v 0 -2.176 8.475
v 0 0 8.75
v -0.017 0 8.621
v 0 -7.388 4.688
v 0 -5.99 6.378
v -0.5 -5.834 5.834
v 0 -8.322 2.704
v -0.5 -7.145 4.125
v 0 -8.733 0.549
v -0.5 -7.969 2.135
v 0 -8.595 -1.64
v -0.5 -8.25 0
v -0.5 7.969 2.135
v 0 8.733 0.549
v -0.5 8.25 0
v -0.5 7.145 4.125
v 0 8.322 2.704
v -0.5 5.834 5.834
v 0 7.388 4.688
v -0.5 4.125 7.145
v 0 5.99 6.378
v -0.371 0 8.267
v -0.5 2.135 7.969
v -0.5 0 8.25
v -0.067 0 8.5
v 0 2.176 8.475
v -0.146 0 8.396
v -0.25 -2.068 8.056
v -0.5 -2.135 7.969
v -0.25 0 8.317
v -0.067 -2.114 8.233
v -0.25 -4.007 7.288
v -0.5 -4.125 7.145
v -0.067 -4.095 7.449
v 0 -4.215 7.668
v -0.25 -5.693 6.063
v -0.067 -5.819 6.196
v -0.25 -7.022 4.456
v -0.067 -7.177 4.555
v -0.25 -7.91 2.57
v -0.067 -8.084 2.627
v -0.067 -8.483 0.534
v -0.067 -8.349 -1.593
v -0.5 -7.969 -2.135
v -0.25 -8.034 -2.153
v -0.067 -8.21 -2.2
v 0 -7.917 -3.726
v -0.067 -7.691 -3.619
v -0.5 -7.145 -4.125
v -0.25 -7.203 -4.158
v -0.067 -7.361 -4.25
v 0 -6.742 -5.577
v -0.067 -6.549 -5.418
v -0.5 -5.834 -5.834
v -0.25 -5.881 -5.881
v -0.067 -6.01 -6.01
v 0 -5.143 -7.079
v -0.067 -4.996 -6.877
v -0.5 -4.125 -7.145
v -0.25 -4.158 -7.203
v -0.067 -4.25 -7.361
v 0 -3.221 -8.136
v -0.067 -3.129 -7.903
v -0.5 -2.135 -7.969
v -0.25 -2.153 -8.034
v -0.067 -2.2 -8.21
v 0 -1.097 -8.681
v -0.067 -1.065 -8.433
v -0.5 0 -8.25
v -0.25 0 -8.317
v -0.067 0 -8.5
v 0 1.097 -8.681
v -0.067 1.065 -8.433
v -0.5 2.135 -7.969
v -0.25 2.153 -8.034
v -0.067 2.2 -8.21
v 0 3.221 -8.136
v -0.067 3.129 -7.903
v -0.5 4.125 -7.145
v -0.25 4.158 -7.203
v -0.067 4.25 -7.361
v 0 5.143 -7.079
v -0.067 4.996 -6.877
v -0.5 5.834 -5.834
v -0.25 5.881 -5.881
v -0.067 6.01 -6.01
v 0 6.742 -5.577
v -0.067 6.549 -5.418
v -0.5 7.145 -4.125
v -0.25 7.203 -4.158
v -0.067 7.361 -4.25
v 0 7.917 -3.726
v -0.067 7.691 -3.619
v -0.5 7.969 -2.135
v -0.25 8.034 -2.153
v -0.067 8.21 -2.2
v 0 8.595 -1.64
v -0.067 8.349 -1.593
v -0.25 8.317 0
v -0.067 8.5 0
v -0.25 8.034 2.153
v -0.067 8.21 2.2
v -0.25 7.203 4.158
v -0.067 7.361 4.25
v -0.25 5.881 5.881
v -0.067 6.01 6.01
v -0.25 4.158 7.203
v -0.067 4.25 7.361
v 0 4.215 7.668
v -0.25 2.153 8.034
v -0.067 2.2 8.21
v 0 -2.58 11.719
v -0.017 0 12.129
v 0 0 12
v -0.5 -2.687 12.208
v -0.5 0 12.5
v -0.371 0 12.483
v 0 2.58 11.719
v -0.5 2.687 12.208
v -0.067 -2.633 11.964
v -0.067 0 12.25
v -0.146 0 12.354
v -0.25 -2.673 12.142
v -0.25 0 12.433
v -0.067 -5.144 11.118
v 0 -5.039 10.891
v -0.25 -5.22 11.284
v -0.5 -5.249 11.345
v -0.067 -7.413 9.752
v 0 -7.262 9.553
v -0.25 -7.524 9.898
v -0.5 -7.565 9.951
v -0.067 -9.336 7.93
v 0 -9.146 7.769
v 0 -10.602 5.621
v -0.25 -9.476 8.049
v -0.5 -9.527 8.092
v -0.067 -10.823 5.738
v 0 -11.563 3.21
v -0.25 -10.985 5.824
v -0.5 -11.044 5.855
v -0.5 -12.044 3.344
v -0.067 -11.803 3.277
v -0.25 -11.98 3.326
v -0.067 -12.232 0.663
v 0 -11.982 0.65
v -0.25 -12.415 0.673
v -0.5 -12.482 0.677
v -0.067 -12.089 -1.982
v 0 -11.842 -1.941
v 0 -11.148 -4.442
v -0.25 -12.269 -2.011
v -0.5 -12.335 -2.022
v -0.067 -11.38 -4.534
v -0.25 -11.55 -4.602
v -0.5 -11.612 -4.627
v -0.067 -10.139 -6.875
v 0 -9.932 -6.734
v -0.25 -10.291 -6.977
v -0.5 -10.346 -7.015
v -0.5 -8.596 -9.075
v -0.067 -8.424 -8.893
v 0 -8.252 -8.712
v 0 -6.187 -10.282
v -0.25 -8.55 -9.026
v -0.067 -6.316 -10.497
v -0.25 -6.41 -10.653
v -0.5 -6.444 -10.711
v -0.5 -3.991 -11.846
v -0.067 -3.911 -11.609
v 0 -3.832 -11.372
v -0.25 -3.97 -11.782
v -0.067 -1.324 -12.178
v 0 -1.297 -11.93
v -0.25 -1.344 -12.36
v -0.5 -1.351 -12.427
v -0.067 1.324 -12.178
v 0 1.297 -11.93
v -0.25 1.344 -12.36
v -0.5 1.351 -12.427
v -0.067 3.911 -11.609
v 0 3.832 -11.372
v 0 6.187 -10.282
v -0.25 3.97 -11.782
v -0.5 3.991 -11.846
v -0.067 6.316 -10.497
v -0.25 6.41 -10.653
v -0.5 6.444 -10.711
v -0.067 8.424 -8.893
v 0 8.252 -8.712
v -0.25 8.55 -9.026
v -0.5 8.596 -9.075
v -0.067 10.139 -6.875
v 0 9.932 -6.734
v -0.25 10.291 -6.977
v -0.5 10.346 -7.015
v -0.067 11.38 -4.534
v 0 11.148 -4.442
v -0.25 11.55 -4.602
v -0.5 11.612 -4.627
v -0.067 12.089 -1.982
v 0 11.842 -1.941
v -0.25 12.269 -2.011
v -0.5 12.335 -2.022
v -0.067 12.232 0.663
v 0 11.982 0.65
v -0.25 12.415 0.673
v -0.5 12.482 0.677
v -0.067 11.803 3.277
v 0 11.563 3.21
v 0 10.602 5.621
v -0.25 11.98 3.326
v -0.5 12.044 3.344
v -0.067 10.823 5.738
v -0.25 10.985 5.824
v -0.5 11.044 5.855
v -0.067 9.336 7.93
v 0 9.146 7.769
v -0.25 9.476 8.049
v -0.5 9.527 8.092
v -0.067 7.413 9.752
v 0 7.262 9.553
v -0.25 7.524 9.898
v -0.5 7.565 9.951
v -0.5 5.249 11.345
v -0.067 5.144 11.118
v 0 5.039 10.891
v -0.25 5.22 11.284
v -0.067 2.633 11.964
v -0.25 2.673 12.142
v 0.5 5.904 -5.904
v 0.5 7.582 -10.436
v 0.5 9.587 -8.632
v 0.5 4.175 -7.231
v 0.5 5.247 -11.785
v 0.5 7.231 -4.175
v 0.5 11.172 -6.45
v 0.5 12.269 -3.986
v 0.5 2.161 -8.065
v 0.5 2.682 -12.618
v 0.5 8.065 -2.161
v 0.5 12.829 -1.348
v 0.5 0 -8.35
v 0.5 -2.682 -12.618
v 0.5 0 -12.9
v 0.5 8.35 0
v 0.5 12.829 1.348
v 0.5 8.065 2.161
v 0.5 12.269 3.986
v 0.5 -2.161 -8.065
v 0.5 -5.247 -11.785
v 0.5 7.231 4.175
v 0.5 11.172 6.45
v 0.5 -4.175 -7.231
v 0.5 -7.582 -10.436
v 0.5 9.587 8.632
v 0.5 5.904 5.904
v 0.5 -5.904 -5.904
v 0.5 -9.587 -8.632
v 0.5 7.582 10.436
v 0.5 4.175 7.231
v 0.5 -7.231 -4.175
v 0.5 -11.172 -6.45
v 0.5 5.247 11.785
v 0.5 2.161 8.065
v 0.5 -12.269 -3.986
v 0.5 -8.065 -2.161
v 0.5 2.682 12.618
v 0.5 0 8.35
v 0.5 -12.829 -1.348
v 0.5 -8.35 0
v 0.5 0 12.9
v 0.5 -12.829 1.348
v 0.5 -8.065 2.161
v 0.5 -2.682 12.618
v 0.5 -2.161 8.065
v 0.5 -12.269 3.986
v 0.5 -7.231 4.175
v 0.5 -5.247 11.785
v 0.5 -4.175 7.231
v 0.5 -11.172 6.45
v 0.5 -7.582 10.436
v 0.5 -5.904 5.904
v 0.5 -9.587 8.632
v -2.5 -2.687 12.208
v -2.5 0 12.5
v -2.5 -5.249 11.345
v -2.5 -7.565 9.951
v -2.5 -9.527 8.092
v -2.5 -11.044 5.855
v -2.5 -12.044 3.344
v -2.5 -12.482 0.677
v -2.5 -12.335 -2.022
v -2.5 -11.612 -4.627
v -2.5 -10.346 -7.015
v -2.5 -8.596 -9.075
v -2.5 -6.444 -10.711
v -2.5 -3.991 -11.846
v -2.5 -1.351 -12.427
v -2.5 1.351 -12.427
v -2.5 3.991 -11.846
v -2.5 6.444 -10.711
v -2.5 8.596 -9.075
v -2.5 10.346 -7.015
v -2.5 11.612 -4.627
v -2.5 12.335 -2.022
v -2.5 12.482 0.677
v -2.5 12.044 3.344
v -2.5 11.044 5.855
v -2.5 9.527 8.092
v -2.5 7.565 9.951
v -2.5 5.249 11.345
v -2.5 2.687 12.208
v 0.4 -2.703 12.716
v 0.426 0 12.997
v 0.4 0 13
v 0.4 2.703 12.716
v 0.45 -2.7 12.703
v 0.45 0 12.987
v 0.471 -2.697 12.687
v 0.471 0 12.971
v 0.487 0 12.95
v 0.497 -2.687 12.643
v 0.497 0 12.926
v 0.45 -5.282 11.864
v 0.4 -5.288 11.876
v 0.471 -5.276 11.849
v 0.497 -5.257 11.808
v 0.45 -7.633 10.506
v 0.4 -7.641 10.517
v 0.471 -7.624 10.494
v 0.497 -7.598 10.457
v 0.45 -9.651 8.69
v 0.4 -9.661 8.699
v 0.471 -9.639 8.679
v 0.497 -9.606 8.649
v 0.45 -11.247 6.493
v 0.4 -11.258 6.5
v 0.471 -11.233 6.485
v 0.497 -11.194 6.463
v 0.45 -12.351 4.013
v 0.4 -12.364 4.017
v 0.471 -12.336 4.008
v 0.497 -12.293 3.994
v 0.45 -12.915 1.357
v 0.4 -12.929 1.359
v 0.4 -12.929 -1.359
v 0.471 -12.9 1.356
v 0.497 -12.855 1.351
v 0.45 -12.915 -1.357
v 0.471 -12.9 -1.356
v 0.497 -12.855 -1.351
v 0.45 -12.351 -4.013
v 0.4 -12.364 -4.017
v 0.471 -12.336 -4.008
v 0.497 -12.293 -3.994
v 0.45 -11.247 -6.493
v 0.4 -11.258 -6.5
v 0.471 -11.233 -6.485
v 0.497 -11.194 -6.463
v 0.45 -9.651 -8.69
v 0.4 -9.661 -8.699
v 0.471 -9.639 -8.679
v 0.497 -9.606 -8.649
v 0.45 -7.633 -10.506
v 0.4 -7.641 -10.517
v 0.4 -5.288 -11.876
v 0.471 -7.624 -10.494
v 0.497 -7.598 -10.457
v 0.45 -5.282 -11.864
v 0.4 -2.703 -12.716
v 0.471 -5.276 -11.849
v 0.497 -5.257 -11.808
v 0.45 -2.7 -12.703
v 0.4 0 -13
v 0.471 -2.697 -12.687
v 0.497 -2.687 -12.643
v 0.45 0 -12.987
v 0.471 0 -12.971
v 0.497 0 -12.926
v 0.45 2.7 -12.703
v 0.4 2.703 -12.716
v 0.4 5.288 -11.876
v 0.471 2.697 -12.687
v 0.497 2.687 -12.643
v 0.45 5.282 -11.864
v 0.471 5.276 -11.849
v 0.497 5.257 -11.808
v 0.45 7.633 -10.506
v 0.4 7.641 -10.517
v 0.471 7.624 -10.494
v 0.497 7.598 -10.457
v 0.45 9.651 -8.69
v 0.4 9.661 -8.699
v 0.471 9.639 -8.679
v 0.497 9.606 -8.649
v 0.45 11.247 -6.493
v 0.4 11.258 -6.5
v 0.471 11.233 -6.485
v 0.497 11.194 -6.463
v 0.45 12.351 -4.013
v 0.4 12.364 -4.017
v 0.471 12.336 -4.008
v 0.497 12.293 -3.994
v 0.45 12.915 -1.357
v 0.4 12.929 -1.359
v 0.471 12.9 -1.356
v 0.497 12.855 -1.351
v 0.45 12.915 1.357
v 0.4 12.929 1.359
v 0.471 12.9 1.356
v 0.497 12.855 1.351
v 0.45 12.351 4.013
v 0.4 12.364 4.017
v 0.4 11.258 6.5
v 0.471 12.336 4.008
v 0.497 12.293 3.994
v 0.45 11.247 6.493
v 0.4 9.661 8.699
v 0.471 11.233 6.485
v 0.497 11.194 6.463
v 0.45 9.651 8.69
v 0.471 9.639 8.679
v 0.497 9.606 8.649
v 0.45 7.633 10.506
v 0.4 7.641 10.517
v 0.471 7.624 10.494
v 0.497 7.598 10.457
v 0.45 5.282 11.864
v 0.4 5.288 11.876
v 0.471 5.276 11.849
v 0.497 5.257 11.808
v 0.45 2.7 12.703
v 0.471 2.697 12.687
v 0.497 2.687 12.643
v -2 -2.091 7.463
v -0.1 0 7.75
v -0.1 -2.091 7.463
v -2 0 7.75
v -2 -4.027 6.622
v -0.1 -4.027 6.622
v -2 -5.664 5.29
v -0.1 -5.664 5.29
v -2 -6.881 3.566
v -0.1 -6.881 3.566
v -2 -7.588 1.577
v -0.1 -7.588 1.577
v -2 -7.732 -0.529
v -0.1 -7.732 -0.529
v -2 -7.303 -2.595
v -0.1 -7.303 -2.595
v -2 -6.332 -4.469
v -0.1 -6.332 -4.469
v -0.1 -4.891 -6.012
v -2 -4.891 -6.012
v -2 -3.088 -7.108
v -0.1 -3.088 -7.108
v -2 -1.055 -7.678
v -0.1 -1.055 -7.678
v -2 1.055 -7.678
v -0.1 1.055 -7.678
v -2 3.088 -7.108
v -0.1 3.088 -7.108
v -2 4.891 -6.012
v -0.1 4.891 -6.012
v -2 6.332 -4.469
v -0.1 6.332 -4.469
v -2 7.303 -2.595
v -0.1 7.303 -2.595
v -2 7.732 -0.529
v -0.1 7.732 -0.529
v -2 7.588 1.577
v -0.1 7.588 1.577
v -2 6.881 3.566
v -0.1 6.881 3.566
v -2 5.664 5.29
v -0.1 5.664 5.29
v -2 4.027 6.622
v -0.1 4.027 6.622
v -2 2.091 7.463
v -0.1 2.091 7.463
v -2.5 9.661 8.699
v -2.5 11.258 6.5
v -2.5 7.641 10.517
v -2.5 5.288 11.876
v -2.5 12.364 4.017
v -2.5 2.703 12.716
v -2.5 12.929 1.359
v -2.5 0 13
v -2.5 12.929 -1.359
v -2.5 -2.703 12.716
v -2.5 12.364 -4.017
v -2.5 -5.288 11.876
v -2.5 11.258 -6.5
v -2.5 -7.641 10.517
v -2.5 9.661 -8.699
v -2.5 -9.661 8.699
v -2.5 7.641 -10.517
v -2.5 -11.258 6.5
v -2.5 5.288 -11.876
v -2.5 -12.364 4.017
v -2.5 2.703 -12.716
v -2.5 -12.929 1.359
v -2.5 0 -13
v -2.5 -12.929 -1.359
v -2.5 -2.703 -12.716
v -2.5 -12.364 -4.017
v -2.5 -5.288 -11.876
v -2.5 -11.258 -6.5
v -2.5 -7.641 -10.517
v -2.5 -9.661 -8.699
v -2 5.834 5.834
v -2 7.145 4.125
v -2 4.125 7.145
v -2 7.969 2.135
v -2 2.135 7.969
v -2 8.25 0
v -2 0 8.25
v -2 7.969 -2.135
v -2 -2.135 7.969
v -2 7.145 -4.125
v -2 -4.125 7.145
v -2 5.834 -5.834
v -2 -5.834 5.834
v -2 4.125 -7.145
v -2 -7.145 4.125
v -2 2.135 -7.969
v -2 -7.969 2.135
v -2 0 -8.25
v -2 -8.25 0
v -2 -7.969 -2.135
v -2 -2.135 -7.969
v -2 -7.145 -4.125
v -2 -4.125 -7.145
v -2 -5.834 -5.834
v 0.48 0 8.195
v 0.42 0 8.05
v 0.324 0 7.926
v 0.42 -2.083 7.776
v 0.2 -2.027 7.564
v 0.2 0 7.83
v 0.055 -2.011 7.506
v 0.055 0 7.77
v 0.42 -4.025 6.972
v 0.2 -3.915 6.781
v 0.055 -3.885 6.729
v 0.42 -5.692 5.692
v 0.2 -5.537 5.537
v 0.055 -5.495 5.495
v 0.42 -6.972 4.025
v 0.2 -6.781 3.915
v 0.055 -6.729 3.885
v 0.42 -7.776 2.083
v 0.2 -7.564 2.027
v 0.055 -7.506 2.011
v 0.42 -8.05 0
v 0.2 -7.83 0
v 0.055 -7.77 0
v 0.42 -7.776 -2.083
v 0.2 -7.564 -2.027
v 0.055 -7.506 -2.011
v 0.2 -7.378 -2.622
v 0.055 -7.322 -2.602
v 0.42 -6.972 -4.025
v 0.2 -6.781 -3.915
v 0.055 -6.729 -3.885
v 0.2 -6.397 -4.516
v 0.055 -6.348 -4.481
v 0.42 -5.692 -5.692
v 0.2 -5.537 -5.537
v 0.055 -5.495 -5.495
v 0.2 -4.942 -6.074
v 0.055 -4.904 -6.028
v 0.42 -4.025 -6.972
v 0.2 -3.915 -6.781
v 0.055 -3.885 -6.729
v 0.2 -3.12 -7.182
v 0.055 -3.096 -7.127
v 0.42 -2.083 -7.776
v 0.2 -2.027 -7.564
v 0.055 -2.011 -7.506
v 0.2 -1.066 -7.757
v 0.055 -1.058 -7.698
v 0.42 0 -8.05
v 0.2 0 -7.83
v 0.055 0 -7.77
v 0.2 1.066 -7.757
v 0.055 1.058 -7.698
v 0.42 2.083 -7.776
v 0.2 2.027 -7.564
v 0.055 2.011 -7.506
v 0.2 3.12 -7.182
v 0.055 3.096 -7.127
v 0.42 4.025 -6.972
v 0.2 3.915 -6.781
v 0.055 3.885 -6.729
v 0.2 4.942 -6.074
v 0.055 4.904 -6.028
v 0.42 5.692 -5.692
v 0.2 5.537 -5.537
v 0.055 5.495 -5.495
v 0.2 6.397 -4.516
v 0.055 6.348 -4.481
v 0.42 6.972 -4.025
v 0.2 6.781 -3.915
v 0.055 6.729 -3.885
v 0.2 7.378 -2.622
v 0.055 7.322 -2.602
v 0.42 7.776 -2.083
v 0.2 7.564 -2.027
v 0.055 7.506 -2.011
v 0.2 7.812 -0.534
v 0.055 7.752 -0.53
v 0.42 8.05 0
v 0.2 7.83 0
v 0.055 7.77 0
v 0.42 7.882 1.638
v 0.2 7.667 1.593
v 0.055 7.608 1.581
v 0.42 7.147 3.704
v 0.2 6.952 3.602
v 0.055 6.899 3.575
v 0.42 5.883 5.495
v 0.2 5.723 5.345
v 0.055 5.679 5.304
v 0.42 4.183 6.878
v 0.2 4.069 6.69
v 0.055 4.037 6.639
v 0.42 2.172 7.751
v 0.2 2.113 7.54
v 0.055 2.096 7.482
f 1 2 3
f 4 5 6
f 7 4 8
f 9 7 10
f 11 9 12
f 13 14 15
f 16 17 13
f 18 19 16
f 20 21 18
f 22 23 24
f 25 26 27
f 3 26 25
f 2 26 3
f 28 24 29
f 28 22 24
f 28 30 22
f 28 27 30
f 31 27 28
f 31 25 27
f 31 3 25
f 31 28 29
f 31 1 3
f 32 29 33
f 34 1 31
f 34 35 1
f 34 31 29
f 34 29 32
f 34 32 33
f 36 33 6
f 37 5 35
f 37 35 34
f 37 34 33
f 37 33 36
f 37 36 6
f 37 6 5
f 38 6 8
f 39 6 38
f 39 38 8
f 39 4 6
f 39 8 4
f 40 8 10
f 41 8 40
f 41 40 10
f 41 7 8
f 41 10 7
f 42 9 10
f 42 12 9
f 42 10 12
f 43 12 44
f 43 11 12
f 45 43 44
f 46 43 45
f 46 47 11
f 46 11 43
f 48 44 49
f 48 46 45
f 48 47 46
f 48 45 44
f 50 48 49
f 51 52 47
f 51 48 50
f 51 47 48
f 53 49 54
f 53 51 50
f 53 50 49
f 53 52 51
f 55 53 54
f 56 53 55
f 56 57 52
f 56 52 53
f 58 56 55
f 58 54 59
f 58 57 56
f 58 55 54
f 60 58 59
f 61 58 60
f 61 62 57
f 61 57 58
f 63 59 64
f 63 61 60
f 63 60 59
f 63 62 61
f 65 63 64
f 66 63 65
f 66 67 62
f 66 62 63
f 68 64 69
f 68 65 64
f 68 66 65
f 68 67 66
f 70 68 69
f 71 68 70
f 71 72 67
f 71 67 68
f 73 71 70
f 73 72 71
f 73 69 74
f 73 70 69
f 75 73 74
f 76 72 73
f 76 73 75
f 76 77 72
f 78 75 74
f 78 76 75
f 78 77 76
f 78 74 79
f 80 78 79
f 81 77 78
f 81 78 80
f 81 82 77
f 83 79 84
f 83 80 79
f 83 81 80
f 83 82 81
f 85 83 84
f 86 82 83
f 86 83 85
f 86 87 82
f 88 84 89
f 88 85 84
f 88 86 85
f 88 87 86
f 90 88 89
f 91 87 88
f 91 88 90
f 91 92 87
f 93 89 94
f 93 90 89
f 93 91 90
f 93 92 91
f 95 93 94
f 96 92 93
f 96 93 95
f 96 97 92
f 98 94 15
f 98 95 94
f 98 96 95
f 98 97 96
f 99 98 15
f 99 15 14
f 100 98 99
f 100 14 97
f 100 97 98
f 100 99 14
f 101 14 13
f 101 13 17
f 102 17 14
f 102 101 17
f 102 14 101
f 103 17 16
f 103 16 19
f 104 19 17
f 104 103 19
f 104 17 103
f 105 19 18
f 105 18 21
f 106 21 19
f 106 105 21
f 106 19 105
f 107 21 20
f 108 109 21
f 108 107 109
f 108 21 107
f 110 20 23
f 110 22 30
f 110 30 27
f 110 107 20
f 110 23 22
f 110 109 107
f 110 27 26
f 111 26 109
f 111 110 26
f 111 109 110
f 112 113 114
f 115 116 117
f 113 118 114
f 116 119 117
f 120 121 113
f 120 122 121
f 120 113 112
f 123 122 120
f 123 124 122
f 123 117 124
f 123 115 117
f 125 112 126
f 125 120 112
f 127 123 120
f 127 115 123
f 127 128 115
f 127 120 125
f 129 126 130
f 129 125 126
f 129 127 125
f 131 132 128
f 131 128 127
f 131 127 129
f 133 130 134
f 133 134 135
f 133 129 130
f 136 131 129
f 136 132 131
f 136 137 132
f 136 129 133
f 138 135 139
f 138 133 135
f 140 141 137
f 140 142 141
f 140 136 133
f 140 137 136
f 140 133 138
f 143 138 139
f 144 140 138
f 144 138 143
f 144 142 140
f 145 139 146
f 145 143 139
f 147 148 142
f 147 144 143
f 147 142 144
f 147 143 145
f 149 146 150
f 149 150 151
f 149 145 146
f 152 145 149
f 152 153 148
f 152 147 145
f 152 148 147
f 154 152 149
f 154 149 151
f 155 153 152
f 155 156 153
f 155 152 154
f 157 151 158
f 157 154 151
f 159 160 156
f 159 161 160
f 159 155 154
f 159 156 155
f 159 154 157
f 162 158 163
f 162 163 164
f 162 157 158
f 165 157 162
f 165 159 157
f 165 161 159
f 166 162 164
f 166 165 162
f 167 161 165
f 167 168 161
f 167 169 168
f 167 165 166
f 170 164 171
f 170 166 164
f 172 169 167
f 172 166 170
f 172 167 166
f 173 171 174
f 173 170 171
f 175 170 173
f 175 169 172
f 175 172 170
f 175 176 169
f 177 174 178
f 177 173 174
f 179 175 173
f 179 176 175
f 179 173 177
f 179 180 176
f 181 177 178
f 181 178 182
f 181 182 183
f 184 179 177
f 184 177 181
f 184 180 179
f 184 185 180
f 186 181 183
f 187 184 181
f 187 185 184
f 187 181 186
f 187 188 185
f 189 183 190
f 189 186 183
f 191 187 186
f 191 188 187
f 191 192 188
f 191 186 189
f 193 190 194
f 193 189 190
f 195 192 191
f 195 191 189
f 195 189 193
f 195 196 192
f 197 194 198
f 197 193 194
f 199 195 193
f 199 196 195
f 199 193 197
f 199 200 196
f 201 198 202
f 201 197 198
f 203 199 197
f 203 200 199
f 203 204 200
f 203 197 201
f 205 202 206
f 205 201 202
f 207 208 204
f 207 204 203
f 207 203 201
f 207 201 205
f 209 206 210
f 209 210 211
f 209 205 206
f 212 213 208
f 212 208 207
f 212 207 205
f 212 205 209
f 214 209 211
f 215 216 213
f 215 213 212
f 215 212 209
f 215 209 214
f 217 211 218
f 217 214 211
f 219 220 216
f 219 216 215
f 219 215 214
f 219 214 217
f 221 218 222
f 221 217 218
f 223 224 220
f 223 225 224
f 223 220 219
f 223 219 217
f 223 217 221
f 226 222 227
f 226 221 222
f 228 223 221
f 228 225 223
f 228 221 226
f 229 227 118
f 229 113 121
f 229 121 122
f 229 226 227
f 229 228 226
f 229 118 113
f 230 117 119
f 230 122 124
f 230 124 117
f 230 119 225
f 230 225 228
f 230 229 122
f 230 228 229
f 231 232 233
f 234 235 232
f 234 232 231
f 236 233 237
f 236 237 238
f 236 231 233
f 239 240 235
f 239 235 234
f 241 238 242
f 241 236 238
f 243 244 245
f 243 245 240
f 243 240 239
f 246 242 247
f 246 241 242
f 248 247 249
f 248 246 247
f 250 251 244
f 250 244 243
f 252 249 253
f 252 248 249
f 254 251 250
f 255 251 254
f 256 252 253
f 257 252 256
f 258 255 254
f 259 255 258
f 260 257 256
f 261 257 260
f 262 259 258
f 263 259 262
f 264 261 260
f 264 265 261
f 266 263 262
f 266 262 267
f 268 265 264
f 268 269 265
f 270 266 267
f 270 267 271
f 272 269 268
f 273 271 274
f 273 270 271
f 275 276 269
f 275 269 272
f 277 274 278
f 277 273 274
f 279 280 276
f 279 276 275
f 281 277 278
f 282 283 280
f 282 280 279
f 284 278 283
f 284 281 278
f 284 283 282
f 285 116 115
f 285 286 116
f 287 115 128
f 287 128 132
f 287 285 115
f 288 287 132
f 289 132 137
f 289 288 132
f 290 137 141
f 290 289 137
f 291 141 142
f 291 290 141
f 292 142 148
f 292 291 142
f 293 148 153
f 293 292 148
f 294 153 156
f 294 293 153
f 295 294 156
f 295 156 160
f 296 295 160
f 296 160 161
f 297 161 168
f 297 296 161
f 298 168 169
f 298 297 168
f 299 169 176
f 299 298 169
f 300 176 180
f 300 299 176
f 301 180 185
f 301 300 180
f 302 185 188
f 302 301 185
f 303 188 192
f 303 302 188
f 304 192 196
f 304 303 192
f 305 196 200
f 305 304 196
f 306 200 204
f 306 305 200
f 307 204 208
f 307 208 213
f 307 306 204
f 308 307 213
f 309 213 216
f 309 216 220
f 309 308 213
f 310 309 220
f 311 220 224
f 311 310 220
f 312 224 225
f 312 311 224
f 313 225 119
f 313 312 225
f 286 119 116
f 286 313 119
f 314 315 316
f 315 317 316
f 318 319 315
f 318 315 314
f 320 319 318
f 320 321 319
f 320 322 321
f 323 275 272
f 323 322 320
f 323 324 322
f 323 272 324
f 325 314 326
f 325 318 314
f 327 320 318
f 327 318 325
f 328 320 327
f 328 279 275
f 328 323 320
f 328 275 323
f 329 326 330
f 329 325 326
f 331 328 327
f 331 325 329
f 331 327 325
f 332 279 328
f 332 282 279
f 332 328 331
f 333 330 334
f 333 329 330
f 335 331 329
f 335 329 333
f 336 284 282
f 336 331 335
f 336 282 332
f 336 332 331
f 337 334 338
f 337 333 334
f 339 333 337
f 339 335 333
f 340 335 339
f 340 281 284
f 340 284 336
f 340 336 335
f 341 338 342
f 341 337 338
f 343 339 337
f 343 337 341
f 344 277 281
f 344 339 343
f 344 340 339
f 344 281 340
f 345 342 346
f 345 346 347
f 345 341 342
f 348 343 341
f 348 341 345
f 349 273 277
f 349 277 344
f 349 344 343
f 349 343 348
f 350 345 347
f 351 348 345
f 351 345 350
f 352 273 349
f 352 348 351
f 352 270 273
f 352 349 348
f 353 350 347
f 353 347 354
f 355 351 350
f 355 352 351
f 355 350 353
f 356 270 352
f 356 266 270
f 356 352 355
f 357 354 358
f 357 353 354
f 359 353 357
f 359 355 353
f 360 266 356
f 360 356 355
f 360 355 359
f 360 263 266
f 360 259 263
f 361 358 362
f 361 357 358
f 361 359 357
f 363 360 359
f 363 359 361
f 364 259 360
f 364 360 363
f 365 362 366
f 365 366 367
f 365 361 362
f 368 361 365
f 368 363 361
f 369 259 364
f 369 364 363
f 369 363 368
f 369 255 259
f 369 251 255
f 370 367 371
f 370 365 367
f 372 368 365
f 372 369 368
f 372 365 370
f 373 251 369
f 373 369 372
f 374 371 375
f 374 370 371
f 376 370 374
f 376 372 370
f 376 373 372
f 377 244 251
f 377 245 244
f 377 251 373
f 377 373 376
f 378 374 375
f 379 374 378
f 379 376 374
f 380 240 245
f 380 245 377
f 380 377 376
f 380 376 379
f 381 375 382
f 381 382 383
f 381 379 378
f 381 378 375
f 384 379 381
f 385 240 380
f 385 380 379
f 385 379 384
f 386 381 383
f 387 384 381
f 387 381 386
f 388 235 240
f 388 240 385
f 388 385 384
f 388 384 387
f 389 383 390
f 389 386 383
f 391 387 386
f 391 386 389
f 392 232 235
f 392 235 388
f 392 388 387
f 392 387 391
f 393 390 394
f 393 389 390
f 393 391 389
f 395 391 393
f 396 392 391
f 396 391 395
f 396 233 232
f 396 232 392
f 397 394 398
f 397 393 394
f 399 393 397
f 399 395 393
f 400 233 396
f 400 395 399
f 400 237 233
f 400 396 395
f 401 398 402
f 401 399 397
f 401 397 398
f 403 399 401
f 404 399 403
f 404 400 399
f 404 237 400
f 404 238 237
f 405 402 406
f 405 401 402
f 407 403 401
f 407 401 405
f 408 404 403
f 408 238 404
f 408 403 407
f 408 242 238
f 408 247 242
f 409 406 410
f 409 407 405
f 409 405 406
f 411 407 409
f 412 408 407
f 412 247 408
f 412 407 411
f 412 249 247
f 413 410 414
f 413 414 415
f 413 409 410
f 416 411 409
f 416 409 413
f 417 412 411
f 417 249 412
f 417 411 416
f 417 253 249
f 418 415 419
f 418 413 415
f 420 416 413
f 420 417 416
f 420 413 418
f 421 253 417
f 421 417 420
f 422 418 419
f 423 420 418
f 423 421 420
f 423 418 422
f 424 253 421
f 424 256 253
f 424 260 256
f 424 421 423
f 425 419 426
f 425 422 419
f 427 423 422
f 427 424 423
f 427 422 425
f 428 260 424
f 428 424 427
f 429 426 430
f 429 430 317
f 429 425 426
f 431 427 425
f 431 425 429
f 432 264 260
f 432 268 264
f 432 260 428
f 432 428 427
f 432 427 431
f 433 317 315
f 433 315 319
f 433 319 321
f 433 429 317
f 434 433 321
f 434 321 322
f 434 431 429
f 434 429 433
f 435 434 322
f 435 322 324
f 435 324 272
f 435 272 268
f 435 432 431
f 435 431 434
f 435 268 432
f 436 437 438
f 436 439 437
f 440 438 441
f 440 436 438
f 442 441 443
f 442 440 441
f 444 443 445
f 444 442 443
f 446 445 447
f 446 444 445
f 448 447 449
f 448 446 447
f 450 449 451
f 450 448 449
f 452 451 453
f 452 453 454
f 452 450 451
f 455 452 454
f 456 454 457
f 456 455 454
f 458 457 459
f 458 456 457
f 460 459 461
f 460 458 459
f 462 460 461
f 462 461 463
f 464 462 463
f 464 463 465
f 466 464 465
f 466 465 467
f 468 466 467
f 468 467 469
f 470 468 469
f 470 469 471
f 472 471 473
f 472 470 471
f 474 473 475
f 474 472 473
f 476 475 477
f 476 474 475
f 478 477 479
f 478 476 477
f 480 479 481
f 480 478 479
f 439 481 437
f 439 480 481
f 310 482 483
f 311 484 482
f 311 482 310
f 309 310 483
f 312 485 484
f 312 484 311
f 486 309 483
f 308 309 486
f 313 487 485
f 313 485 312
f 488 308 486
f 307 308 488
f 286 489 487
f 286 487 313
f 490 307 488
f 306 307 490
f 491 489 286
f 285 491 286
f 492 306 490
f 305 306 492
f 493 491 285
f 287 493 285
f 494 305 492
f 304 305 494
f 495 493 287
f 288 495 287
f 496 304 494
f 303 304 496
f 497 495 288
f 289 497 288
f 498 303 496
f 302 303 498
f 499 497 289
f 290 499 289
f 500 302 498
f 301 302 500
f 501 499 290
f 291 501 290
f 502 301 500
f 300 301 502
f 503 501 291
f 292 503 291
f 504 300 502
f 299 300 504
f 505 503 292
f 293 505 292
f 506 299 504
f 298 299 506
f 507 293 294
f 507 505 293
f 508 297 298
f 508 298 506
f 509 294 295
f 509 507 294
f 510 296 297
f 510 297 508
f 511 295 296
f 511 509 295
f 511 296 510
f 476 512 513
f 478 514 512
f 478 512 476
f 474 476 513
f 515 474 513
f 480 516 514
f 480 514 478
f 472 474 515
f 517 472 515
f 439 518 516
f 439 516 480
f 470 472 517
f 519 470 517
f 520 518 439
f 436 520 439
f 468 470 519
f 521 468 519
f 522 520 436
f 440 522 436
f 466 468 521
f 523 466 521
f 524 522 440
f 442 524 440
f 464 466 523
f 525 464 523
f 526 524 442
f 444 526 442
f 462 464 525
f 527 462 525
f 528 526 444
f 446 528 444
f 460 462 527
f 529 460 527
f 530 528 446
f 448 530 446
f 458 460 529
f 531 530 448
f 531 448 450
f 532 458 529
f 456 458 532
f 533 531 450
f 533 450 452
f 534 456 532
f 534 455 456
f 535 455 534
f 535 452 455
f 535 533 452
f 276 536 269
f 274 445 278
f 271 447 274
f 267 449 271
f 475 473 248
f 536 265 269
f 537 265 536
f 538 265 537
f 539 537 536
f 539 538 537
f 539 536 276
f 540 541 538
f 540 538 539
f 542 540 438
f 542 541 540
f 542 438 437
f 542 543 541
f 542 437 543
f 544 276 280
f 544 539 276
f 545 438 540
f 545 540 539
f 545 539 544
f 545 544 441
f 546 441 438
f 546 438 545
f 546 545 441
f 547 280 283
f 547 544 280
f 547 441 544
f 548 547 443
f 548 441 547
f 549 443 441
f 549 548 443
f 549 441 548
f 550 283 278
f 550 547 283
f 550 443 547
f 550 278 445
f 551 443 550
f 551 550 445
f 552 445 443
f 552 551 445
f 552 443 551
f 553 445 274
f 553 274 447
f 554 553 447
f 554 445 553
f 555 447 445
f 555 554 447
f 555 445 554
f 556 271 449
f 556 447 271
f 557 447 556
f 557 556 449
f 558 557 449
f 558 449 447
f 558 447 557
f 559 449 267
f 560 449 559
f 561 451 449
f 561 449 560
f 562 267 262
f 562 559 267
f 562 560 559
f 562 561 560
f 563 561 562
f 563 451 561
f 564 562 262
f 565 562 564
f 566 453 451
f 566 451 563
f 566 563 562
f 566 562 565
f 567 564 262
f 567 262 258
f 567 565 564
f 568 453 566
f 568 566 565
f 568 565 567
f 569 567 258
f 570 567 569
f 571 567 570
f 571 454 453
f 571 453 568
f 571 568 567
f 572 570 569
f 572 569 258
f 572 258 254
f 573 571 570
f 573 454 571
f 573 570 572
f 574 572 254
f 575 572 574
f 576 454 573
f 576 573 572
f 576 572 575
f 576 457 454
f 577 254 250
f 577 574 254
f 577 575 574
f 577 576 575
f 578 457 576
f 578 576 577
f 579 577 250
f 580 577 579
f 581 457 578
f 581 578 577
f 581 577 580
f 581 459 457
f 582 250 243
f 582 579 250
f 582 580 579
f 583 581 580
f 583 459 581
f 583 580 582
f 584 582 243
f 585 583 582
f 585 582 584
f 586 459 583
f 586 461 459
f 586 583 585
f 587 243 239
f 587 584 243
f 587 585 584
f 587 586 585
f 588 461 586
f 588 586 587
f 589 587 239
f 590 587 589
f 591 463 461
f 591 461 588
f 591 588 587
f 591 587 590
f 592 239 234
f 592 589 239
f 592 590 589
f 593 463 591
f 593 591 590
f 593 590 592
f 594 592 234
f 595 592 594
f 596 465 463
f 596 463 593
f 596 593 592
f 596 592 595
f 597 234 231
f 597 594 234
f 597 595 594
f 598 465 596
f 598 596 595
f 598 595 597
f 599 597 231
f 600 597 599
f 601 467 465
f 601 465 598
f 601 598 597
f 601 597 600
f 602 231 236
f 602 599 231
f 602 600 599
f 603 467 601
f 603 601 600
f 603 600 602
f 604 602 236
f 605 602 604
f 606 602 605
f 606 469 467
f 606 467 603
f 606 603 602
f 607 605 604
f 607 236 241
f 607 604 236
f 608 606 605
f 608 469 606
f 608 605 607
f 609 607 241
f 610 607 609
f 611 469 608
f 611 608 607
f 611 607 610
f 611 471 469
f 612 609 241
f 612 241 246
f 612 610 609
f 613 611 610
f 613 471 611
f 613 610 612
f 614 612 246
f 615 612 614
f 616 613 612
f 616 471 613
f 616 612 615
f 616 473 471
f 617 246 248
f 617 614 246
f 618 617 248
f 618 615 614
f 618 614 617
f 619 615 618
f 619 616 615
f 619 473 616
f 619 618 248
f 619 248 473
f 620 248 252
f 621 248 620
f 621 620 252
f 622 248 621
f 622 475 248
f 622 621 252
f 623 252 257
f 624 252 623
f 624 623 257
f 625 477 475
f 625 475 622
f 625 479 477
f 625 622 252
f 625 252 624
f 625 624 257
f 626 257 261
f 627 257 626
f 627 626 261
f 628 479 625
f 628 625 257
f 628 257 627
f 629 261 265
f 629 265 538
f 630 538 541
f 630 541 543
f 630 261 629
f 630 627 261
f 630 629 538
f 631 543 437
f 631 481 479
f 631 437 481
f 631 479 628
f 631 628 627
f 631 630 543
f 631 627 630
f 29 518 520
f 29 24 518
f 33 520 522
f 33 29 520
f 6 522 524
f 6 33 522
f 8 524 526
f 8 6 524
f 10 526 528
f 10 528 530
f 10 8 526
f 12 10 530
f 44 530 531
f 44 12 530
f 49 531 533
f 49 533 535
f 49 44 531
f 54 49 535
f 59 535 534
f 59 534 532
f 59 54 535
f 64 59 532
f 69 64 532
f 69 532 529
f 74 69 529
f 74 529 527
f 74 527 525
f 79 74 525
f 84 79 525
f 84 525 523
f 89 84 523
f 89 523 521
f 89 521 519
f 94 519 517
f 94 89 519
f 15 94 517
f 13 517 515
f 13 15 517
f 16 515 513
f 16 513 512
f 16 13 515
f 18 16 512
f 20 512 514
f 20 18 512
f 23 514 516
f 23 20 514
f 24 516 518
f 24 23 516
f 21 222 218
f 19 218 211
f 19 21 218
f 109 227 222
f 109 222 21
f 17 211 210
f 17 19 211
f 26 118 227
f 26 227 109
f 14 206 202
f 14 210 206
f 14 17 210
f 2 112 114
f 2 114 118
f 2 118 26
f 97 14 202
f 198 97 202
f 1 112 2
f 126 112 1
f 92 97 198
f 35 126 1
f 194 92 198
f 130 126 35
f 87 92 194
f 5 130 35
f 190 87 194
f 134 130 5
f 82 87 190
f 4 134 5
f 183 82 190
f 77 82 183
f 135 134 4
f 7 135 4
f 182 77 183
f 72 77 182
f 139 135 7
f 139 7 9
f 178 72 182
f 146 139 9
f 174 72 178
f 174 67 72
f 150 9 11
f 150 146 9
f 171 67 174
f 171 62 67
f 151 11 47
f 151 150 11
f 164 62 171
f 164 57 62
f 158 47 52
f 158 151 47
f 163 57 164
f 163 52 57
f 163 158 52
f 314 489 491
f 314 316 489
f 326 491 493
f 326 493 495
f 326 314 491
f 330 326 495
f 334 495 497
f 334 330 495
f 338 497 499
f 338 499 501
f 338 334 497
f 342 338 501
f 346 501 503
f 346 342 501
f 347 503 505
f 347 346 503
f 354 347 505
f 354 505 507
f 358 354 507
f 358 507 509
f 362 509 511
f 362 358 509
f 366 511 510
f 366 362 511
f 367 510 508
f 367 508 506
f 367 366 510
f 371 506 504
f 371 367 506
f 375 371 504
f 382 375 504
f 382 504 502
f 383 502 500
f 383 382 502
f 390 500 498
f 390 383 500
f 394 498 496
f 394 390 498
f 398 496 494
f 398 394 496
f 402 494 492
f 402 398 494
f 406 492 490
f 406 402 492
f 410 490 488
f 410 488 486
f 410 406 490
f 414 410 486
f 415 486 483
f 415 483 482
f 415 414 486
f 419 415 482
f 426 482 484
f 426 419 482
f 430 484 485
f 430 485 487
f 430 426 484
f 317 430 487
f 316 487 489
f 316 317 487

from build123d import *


with BuildPart() as part:
    # Esquisse1 → Révolution1 (revolve)
    with BuildSketch(Plane.XY, mode=Mode.PRIVATE) as r_volution1_sk:
        with BuildLine():
            Line((0, 8.75), (0, 12))
            ThreePointArc((0, 12), (-0.146446609, 12.353553391), (-0.5, 12.5))
            Line((-0.5, 12.5), (-2.5, 12.5))
            Line((-2.5, 12.5), (-2.5, 13))
            Line((-2.5, 13), (0.4, 13))
            ThreePointArc((0.4, 13), (0.470710678, 12.970710678), (0.5, 12.9))
            Line((0.5, 12.9), (0.5, 8.35))
            ThreePointArc((0.5, 8.35), (0.324264069, 7.925735931), (-0.1, 7.75))
            Line((-0.1, 7.75), (-2, 7.75))
            Line((-2, 7.75), (-2, 8.25))
            Line((-2, 8.25), (-0.5, 8.25))
            ThreePointArc((-0.5, 8.25), (-0.146446609, 8.396446609), (0, 8.75))
        make_face()
    revolve(r_volution1_sk.sketch.rotate(Axis((-5.956424792, 0, 0), (1, 0, 0)), 90), axis=Axis((-5.956424792, 0, 0), (1, 0, 0)))  # turned: the seam where the file's is


solid = part.part
